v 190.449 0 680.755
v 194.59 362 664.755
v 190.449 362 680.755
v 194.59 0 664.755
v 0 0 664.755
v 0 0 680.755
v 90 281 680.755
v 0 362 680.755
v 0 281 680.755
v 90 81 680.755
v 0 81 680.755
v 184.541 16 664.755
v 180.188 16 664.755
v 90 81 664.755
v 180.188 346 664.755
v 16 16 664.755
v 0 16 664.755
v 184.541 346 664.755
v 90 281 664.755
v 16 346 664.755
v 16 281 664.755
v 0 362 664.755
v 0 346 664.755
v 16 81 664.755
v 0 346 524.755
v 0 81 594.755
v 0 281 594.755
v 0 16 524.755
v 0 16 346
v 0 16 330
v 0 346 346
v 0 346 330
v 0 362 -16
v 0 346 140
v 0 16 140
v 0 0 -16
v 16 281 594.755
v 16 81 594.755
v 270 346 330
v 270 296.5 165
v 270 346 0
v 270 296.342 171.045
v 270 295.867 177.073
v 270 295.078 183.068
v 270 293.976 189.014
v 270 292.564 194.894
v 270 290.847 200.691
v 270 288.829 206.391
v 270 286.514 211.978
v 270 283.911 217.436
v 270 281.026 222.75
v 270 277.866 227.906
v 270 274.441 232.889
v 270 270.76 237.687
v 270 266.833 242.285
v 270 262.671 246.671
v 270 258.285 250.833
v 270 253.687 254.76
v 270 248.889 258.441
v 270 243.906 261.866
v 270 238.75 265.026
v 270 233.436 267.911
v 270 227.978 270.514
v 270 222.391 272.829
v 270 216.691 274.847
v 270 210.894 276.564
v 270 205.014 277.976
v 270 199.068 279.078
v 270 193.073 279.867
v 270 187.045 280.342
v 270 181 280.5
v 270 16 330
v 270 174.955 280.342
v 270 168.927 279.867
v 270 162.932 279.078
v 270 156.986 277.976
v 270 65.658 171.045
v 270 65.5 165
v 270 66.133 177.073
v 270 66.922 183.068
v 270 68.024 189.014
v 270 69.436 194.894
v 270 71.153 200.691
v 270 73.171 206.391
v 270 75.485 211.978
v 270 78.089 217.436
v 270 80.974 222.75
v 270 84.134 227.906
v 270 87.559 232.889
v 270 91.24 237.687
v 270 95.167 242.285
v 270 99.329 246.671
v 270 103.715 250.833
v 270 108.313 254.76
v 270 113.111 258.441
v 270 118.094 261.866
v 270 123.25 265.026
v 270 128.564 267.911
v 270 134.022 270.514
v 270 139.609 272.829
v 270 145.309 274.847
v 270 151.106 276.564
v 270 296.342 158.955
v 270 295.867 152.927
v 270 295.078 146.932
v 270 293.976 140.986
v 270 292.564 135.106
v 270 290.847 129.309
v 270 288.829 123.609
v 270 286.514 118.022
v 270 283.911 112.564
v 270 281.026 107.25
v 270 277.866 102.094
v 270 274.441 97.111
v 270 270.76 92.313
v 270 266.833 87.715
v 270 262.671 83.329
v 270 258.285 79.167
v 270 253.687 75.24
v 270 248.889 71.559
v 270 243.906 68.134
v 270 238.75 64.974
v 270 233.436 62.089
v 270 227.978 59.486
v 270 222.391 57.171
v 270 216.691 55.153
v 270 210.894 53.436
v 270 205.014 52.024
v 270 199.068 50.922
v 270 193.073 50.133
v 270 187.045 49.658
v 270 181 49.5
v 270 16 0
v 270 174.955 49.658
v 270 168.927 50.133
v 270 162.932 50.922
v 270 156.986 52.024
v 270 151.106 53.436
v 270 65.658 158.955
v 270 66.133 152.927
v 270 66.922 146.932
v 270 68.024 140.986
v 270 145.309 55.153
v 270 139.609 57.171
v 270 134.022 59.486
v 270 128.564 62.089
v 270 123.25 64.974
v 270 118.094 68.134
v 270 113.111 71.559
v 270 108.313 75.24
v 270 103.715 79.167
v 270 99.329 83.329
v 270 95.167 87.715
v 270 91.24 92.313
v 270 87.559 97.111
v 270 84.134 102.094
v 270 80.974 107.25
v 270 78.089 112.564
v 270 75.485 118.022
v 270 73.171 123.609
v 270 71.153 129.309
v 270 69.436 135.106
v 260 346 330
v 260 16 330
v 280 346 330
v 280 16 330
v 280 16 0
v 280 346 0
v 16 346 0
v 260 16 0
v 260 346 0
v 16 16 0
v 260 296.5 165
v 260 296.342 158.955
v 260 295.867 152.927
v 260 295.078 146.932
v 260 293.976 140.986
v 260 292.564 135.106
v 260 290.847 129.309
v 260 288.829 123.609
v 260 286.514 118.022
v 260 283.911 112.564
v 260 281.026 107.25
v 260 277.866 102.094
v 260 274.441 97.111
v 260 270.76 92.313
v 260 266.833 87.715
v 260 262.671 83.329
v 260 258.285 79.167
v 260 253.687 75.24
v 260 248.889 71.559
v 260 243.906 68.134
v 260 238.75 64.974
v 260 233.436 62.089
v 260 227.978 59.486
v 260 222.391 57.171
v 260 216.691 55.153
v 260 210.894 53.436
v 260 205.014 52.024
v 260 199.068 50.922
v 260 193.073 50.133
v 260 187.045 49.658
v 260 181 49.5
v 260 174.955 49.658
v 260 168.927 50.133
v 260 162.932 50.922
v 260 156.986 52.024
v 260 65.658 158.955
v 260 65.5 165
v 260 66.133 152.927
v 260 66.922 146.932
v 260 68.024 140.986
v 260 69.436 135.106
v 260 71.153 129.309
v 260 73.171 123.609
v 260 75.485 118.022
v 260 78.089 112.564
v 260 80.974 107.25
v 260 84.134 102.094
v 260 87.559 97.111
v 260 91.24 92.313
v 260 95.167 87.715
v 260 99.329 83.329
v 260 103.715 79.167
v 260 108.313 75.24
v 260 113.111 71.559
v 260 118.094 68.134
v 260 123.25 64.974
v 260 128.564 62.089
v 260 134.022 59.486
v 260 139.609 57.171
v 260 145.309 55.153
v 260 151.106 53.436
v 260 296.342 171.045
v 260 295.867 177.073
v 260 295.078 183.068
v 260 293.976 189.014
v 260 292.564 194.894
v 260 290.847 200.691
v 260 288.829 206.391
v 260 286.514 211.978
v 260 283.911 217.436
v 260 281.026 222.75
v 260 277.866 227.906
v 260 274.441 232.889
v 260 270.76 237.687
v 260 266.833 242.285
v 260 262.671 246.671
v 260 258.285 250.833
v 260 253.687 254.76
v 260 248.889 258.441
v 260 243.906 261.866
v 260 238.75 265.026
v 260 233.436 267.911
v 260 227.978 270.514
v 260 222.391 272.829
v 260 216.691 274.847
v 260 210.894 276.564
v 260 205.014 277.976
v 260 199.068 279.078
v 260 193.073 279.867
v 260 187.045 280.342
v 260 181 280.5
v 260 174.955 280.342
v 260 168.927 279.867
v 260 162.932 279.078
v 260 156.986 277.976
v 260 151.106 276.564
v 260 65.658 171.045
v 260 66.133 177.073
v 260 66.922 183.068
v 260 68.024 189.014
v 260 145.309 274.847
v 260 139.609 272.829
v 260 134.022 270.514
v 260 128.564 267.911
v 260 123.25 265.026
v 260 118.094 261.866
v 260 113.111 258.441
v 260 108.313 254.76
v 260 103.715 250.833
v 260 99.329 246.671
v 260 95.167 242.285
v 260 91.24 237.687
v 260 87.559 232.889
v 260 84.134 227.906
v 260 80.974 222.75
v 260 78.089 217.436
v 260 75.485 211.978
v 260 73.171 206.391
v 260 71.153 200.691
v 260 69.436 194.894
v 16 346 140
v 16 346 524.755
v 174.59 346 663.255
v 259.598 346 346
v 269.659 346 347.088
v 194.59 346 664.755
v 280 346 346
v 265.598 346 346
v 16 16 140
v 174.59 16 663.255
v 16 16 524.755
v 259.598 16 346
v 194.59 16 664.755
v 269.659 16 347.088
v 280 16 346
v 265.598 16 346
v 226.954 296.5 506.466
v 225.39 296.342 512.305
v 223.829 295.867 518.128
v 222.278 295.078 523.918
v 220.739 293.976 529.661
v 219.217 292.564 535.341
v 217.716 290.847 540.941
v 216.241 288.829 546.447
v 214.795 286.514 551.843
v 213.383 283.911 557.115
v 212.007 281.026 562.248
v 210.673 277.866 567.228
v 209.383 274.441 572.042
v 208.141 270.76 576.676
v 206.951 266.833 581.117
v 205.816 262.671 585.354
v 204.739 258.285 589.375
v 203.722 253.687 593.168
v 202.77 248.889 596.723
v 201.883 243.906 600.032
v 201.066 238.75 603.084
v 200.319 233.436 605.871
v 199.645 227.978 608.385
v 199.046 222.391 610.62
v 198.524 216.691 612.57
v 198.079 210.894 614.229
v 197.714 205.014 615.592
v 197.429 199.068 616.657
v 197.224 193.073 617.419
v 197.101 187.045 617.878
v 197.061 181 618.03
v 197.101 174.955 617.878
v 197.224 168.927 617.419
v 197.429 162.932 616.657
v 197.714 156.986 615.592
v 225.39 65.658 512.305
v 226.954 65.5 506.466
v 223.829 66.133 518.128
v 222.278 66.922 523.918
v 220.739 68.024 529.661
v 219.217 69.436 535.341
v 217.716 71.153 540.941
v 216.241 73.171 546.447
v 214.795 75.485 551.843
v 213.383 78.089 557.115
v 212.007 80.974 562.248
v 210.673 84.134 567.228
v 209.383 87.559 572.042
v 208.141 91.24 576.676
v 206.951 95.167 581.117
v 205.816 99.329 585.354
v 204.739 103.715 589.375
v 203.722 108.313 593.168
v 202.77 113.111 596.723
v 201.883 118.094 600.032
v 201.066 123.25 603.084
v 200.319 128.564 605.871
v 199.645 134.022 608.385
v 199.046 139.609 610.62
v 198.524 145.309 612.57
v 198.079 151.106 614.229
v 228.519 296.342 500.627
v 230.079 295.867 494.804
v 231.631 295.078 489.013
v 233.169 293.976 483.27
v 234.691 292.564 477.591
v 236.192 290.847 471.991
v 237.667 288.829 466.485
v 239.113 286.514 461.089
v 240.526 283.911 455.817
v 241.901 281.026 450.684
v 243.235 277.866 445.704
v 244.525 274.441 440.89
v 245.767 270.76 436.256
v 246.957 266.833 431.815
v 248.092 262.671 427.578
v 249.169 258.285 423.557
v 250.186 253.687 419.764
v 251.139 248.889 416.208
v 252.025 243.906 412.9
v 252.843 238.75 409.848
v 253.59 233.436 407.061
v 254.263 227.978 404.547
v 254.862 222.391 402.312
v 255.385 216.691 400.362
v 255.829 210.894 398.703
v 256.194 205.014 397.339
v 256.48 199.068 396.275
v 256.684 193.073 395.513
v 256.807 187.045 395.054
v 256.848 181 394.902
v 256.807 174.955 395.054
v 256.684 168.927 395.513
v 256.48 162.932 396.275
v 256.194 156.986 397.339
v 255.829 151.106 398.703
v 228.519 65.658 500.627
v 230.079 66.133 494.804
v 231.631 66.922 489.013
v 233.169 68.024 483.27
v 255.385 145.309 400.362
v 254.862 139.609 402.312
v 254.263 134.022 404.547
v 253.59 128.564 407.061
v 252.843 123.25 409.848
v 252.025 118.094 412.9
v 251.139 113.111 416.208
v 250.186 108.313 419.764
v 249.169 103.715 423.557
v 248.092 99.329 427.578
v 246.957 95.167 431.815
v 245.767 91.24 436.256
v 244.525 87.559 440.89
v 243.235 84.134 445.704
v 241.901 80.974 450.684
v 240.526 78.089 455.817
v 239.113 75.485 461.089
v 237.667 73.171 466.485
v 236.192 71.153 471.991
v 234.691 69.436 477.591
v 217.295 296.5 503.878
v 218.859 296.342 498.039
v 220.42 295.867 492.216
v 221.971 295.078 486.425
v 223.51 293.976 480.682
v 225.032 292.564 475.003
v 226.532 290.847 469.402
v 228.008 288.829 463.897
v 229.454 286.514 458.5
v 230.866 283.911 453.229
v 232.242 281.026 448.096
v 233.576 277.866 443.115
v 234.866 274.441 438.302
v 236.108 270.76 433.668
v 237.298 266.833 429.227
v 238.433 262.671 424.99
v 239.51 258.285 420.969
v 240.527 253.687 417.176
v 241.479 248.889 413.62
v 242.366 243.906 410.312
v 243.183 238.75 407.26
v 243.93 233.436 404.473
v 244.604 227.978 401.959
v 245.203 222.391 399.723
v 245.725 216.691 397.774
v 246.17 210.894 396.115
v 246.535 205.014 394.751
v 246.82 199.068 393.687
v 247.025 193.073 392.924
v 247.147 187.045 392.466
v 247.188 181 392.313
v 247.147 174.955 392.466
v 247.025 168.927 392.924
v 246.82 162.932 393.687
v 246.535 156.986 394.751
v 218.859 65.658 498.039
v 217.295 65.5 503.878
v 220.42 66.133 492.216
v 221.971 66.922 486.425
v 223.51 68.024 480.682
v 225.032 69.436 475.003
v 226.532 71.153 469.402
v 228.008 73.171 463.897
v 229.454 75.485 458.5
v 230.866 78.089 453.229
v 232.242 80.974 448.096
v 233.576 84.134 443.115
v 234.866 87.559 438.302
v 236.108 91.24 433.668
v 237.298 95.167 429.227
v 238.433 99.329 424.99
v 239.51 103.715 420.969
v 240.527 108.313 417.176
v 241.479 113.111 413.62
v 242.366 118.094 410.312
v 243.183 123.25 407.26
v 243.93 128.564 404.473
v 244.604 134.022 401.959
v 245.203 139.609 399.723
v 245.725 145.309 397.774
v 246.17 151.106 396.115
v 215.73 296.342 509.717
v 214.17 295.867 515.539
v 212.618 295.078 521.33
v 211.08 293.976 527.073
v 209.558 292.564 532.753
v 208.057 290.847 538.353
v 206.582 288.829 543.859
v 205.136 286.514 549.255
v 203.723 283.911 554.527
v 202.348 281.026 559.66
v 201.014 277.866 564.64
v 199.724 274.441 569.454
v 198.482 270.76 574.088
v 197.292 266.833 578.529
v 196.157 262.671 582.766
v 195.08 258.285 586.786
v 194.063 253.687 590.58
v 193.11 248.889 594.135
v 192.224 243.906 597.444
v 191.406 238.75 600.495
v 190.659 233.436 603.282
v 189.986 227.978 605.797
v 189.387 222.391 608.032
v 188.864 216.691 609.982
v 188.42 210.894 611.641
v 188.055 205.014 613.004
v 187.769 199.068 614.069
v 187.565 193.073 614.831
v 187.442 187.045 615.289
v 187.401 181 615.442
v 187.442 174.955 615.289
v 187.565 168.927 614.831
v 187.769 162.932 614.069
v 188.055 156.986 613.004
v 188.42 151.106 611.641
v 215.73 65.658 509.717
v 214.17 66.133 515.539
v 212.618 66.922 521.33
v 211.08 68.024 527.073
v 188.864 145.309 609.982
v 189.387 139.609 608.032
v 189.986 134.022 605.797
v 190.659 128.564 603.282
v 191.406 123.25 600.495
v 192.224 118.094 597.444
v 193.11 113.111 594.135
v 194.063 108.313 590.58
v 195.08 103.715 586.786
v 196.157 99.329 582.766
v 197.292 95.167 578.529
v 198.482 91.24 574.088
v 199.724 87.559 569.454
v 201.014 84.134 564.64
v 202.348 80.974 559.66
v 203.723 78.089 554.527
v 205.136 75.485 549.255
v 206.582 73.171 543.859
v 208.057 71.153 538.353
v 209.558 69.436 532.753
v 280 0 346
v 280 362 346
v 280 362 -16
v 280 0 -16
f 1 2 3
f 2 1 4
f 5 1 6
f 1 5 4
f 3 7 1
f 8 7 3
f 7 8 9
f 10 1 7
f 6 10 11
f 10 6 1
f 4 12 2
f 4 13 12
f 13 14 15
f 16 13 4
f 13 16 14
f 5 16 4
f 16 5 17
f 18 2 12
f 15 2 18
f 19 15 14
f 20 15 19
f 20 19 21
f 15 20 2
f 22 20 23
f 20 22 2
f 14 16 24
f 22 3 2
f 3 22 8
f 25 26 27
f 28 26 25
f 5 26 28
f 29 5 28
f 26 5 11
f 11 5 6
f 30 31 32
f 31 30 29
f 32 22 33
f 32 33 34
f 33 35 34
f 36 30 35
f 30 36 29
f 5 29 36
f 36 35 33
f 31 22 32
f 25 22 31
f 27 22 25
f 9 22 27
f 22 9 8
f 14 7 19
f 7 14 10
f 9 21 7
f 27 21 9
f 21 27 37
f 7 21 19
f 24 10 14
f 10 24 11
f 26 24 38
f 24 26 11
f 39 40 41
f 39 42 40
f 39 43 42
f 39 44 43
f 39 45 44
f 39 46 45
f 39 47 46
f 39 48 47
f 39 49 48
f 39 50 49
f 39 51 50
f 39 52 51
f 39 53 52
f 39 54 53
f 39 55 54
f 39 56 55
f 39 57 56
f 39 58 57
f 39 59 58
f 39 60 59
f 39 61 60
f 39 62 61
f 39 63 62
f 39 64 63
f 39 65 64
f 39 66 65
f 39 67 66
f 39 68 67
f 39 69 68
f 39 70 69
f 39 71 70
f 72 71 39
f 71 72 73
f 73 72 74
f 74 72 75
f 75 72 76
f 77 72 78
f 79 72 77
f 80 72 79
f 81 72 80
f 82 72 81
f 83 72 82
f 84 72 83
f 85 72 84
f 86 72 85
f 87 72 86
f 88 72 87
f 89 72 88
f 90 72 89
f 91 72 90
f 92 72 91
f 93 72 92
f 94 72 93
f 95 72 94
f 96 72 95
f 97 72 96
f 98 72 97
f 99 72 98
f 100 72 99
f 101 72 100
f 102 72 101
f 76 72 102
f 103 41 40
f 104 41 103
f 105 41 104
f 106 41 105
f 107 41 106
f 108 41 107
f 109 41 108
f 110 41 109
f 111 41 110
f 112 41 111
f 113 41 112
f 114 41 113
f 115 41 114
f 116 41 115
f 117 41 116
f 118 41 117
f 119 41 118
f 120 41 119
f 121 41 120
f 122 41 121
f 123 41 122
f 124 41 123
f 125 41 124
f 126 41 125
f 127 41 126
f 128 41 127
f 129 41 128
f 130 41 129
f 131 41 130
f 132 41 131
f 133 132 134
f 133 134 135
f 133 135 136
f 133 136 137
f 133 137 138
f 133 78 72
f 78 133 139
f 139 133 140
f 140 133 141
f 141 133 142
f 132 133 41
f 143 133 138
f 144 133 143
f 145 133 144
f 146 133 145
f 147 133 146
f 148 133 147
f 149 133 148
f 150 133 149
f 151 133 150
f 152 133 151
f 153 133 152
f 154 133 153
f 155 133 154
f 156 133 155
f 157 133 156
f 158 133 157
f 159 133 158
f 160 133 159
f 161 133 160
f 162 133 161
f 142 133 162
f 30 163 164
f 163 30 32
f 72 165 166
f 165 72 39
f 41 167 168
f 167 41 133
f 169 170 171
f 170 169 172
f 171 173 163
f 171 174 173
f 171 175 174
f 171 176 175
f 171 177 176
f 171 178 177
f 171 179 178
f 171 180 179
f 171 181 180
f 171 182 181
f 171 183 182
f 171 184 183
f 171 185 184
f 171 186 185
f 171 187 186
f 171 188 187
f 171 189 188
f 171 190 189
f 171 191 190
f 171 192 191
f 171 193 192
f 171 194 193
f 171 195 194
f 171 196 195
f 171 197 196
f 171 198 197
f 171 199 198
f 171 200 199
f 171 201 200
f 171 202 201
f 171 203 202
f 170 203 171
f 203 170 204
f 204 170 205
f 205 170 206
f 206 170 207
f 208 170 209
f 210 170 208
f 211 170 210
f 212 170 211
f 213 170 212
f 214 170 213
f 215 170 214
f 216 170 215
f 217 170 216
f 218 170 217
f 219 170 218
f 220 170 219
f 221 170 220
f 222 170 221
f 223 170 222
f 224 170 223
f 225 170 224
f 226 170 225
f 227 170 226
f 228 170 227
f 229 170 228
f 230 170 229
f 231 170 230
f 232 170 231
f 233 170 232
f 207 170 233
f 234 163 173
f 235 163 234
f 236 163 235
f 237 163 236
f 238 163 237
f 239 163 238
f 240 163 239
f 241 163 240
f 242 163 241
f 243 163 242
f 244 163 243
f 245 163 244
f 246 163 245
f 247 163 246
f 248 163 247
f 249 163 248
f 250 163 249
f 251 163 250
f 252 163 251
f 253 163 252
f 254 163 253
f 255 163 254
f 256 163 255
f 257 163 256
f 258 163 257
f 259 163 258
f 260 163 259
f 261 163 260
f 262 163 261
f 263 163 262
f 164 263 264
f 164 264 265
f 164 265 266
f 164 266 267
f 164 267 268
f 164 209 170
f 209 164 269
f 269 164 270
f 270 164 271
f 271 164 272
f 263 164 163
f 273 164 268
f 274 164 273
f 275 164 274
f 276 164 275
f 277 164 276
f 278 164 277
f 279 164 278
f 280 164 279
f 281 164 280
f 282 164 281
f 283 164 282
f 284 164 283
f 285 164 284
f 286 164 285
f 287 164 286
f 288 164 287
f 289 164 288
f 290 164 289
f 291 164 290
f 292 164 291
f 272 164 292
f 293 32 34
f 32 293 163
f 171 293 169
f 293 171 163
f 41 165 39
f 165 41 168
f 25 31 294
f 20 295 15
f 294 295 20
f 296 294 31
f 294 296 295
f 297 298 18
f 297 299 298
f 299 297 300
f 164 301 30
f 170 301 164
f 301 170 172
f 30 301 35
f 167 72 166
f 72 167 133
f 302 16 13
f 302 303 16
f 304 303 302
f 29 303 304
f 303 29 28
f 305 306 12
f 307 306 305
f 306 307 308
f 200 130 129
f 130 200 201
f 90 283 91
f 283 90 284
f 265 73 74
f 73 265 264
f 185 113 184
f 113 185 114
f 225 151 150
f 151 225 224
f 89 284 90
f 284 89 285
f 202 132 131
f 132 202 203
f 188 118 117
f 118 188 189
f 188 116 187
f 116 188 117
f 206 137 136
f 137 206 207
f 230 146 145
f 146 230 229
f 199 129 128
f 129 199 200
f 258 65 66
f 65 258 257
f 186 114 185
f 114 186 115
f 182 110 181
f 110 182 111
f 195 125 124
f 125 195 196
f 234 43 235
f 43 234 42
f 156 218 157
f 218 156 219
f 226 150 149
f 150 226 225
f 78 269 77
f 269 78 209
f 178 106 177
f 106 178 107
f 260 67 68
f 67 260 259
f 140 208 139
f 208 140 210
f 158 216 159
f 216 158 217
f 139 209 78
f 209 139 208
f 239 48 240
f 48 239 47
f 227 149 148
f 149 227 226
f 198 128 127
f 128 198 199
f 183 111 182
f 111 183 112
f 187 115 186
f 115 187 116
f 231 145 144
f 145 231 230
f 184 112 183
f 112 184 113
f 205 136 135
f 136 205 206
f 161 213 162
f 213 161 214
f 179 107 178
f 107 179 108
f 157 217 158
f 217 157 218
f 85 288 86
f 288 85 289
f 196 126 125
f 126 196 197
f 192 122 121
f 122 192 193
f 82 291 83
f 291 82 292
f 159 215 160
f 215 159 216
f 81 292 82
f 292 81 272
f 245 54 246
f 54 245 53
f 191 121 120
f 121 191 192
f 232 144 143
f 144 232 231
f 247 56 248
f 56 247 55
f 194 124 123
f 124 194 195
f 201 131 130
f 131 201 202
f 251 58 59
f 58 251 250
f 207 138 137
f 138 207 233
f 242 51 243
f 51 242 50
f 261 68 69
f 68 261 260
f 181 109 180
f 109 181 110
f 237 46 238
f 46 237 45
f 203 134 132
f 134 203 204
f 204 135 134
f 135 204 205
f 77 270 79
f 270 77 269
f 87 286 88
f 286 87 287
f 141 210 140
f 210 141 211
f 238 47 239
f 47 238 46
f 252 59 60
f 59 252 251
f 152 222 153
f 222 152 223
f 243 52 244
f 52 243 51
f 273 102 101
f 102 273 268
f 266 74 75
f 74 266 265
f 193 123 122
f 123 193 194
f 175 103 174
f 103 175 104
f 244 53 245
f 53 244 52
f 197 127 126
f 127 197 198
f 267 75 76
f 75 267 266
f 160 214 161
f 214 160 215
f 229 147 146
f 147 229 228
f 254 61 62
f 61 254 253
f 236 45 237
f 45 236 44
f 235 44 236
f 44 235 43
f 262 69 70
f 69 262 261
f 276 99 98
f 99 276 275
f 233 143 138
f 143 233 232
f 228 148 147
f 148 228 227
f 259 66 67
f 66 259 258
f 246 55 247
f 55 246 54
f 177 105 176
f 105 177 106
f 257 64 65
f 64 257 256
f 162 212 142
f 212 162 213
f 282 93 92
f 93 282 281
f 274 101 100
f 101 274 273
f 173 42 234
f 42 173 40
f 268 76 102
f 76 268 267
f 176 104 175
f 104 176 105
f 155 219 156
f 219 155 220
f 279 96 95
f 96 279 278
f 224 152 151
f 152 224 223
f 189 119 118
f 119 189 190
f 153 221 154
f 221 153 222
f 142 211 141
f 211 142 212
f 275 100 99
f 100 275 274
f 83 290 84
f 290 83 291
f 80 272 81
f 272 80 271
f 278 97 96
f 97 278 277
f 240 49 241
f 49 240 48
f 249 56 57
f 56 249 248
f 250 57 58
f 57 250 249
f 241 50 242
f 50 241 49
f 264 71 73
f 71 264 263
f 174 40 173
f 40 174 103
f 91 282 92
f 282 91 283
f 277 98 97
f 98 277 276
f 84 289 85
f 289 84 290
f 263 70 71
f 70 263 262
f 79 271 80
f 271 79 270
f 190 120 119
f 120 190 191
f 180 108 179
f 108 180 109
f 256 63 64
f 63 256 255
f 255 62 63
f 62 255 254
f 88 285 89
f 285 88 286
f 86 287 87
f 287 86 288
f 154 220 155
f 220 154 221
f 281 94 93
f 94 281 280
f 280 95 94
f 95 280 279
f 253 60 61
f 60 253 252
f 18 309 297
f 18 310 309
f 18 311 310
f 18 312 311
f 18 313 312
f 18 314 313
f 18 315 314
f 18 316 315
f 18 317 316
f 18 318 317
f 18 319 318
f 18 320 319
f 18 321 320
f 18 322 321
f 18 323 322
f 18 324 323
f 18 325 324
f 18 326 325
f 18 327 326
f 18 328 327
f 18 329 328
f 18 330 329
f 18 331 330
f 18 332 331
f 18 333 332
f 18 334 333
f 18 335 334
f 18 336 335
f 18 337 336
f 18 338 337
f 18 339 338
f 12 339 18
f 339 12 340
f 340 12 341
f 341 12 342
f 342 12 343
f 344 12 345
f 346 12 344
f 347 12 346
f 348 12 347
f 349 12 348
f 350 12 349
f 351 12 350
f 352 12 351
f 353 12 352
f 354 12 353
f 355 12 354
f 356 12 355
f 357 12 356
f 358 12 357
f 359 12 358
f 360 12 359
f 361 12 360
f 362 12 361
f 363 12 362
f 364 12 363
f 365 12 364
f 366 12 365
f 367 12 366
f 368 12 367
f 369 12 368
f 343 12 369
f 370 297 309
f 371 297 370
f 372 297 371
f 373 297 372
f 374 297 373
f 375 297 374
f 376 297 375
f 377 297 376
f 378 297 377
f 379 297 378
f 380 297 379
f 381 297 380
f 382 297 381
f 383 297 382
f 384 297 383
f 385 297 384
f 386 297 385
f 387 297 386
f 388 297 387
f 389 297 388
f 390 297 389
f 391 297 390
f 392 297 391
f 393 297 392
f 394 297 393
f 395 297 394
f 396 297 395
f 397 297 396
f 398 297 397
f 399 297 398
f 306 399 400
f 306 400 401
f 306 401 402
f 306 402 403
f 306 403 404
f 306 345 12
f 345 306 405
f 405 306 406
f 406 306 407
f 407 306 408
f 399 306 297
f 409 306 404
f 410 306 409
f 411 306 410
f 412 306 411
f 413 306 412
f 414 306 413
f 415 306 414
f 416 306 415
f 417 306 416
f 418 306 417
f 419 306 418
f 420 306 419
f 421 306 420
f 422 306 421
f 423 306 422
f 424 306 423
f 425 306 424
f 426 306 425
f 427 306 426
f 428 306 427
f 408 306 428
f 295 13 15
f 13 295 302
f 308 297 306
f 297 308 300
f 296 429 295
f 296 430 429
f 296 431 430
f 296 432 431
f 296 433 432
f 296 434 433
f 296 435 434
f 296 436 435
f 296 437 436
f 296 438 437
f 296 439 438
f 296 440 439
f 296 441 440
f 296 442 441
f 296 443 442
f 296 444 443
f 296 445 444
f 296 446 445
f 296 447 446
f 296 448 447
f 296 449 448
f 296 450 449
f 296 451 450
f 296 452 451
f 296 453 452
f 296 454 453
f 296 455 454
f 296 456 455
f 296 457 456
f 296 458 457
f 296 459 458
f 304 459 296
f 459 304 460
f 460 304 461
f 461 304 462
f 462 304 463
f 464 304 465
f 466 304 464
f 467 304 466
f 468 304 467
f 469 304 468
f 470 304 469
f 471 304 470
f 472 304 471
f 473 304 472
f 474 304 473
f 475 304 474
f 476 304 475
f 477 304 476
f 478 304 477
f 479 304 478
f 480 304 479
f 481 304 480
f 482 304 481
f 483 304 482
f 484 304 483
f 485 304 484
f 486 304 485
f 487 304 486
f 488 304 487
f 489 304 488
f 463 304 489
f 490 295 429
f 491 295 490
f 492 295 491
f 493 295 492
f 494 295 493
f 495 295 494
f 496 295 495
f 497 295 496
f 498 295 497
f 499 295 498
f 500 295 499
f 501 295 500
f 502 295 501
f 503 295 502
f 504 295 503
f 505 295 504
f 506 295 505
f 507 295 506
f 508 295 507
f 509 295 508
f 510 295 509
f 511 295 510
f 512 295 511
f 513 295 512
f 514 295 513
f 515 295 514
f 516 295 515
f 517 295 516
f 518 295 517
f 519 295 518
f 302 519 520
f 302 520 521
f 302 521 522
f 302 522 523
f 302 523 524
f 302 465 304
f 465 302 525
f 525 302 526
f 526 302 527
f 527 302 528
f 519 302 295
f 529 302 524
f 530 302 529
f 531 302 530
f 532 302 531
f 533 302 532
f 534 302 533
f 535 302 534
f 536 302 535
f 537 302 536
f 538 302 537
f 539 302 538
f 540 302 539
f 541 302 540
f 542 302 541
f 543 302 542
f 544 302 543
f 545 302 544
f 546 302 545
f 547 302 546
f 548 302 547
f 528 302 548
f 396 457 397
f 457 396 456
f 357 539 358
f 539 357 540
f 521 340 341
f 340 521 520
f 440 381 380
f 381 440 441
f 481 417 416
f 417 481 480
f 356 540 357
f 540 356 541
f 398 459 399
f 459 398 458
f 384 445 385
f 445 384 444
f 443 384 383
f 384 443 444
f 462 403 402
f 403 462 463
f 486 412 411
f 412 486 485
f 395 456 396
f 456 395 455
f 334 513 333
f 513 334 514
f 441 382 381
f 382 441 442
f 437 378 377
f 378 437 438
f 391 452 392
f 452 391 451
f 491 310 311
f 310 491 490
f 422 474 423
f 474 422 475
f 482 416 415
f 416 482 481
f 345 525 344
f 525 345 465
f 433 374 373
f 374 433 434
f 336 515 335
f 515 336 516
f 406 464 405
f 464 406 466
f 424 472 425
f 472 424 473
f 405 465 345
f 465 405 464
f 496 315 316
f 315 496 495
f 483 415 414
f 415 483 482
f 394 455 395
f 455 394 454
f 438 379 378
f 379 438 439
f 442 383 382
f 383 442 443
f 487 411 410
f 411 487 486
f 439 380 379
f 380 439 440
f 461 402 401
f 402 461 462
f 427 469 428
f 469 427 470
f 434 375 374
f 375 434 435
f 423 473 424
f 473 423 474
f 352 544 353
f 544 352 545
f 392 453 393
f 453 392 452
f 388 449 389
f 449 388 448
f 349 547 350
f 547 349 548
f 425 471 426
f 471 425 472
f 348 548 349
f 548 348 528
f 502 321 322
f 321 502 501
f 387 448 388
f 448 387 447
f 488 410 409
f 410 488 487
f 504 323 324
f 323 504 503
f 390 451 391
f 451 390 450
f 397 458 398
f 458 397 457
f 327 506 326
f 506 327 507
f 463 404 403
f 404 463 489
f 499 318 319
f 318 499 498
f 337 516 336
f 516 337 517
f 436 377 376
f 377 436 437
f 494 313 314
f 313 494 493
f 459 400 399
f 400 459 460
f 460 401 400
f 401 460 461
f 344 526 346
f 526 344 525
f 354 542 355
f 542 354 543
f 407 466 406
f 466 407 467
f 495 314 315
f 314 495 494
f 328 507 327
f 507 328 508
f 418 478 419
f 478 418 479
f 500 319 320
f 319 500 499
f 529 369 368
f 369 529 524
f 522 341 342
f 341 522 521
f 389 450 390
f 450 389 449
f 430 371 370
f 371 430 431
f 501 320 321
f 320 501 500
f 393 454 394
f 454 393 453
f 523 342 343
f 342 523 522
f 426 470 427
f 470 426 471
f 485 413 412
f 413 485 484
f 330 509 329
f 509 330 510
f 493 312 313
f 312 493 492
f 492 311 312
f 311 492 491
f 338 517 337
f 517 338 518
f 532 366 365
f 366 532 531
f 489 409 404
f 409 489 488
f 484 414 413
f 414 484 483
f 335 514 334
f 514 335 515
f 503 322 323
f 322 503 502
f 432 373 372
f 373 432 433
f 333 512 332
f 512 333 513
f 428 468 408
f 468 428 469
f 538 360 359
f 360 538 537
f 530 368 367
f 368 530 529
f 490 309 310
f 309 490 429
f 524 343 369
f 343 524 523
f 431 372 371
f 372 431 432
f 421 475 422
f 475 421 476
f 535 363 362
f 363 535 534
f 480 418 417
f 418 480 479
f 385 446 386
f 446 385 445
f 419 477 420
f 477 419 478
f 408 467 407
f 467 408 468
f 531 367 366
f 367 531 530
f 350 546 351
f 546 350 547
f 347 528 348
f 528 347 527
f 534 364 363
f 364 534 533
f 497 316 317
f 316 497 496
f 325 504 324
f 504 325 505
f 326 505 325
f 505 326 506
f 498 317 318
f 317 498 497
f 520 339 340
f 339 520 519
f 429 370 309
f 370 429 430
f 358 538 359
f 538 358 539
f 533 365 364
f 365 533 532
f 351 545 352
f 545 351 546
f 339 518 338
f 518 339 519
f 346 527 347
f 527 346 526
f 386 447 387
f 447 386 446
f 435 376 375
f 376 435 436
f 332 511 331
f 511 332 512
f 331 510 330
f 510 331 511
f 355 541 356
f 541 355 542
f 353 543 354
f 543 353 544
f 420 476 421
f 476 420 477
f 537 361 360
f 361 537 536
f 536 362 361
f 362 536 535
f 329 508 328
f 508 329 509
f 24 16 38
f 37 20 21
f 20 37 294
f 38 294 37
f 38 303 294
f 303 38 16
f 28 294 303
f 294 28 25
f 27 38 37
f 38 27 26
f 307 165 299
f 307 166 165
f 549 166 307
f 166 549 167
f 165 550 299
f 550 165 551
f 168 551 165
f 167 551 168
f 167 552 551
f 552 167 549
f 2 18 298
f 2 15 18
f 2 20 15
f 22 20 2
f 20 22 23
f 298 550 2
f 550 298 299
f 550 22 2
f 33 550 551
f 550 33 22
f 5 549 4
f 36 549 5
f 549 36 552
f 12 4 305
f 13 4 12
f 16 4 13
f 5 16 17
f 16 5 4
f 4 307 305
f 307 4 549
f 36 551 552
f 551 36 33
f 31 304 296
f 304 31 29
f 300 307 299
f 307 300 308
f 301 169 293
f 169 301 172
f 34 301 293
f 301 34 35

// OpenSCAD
// file: modulo3_common.scad
module top()
{
	difference()
	{
		top_offset = sin(angle) * thick;

		rotate([-90, 0, 0])
			linear_extrude(baffle_size + thick*2)
				polygon([	[0, 0],
							[0, thick],
							[in_depth - offset, thick],
							[in_depth - offset - top_offset, 0]]);

		translate([0, thick + (baffle_size - ctr_width) / 2, -1 - thick])
			cube([ctr_depth, ctr_width, thick + 2]);
	}
}

module baffle()
{
	difference()
	{
		cube([baffle_thick, baffle_size, baffle_size]);

		translate([-1, baffle_size/2, baffle_size/2])
			rotate([0, 90, 0])
				cylinder(baffle_thick + 2, speaker_hole, speaker_hole);
	}
}
// main file
include <modulo3_common.scad>

$fn = 120;

thick = 16;
baffle_thick = 10;
baffle_size = 330;
in_depth = 280;
speaker_hole = 231/2;

ctr_width = 200;
ctr_depth = 90;
ctr_height = 70;

angle = 15;

up_back_height = 140;
low_back_height = 140;

up_height	= cos(angle) * baffle_size;
offset		= sin(angle) * baffle_size;
in_height	= up_height + thick + baffle_size;

vol_side	= (in_height * in_depth - up_height * offset / 2) * thick;
vol_top		= ((in_depth - offset) * (baffle_size + thick*2) - (ctr_depth * ctr_width)) * thick;
vol_bottom	= in_depth * (baffle_size + thick*2) * thick;
vol_baffle	= (baffle_size * baffle_size - speaker_hole * speaker_hole * 3.1416) * baffle_thick;
vol_separat	= in_depth * baffle_size * thick;
vol_up_back	= (baffle_size * up_back_height - ctr_width * ctr_height) * thick;
vol_low_back = baffle_size * low_back_height * thick;
vol_all		= (vol_side*2 + vol_top + vol_bottom + vol_baffle * 2 + vol_separat + vol_low_back + vol_up_back) / 1000;

echo("******************************");
echo("volume cm3 = ", vol_all);
echo("walnut kg = ", vol_all * 0.57 / 1000);
echo("pine kg = ", vol_all * 0.42 / 1000);

translate([0, baffle_size + thick*2, 0])
	side();

translate([0, thick, 0])
	side();

// bottom
translate([0, 0, -thick])
	cube([in_depth, baffle_size + thick*2, thick]);

translate([0, 0, in_height + thick])
	top();

// lower baffle
translate([in_depth - baffle_thick*2, thick, 0])
	baffle();

// upper baffle
translate([in_depth - baffle_thick*2, thick, baffle_size + thick - 1.5])
	rotate([0, -angle, 0])
		baffle();

// middle separator
translate([0, thick, baffle_size])
	cube([in_depth, baffle_size, thick]);

// lower back
translate([0, thick, 0])
	cube([thick, baffle_size, low_back_height]);

translate([0, thick, in_height - up_back_height])
	upper_back();

module upper_back()
{
	difference()
	{
		cube([thick, baffle_size, up_back_height]);
		
		translate([-1, (baffle_size - ctr_width) / 2, up_back_height - ctr_height])
			cube([thick + 2, ctr_width, ctr_height]);
	}
}

module side()
{
	rotate([90, 0, 0])
		linear_extrude(thick)
			polygon([	[0, 0],
						[in_depth, 0],
						[in_depth, baffle_size + thick],
						[in_depth - offset, in_height],
						[0, in_height]]);
}
